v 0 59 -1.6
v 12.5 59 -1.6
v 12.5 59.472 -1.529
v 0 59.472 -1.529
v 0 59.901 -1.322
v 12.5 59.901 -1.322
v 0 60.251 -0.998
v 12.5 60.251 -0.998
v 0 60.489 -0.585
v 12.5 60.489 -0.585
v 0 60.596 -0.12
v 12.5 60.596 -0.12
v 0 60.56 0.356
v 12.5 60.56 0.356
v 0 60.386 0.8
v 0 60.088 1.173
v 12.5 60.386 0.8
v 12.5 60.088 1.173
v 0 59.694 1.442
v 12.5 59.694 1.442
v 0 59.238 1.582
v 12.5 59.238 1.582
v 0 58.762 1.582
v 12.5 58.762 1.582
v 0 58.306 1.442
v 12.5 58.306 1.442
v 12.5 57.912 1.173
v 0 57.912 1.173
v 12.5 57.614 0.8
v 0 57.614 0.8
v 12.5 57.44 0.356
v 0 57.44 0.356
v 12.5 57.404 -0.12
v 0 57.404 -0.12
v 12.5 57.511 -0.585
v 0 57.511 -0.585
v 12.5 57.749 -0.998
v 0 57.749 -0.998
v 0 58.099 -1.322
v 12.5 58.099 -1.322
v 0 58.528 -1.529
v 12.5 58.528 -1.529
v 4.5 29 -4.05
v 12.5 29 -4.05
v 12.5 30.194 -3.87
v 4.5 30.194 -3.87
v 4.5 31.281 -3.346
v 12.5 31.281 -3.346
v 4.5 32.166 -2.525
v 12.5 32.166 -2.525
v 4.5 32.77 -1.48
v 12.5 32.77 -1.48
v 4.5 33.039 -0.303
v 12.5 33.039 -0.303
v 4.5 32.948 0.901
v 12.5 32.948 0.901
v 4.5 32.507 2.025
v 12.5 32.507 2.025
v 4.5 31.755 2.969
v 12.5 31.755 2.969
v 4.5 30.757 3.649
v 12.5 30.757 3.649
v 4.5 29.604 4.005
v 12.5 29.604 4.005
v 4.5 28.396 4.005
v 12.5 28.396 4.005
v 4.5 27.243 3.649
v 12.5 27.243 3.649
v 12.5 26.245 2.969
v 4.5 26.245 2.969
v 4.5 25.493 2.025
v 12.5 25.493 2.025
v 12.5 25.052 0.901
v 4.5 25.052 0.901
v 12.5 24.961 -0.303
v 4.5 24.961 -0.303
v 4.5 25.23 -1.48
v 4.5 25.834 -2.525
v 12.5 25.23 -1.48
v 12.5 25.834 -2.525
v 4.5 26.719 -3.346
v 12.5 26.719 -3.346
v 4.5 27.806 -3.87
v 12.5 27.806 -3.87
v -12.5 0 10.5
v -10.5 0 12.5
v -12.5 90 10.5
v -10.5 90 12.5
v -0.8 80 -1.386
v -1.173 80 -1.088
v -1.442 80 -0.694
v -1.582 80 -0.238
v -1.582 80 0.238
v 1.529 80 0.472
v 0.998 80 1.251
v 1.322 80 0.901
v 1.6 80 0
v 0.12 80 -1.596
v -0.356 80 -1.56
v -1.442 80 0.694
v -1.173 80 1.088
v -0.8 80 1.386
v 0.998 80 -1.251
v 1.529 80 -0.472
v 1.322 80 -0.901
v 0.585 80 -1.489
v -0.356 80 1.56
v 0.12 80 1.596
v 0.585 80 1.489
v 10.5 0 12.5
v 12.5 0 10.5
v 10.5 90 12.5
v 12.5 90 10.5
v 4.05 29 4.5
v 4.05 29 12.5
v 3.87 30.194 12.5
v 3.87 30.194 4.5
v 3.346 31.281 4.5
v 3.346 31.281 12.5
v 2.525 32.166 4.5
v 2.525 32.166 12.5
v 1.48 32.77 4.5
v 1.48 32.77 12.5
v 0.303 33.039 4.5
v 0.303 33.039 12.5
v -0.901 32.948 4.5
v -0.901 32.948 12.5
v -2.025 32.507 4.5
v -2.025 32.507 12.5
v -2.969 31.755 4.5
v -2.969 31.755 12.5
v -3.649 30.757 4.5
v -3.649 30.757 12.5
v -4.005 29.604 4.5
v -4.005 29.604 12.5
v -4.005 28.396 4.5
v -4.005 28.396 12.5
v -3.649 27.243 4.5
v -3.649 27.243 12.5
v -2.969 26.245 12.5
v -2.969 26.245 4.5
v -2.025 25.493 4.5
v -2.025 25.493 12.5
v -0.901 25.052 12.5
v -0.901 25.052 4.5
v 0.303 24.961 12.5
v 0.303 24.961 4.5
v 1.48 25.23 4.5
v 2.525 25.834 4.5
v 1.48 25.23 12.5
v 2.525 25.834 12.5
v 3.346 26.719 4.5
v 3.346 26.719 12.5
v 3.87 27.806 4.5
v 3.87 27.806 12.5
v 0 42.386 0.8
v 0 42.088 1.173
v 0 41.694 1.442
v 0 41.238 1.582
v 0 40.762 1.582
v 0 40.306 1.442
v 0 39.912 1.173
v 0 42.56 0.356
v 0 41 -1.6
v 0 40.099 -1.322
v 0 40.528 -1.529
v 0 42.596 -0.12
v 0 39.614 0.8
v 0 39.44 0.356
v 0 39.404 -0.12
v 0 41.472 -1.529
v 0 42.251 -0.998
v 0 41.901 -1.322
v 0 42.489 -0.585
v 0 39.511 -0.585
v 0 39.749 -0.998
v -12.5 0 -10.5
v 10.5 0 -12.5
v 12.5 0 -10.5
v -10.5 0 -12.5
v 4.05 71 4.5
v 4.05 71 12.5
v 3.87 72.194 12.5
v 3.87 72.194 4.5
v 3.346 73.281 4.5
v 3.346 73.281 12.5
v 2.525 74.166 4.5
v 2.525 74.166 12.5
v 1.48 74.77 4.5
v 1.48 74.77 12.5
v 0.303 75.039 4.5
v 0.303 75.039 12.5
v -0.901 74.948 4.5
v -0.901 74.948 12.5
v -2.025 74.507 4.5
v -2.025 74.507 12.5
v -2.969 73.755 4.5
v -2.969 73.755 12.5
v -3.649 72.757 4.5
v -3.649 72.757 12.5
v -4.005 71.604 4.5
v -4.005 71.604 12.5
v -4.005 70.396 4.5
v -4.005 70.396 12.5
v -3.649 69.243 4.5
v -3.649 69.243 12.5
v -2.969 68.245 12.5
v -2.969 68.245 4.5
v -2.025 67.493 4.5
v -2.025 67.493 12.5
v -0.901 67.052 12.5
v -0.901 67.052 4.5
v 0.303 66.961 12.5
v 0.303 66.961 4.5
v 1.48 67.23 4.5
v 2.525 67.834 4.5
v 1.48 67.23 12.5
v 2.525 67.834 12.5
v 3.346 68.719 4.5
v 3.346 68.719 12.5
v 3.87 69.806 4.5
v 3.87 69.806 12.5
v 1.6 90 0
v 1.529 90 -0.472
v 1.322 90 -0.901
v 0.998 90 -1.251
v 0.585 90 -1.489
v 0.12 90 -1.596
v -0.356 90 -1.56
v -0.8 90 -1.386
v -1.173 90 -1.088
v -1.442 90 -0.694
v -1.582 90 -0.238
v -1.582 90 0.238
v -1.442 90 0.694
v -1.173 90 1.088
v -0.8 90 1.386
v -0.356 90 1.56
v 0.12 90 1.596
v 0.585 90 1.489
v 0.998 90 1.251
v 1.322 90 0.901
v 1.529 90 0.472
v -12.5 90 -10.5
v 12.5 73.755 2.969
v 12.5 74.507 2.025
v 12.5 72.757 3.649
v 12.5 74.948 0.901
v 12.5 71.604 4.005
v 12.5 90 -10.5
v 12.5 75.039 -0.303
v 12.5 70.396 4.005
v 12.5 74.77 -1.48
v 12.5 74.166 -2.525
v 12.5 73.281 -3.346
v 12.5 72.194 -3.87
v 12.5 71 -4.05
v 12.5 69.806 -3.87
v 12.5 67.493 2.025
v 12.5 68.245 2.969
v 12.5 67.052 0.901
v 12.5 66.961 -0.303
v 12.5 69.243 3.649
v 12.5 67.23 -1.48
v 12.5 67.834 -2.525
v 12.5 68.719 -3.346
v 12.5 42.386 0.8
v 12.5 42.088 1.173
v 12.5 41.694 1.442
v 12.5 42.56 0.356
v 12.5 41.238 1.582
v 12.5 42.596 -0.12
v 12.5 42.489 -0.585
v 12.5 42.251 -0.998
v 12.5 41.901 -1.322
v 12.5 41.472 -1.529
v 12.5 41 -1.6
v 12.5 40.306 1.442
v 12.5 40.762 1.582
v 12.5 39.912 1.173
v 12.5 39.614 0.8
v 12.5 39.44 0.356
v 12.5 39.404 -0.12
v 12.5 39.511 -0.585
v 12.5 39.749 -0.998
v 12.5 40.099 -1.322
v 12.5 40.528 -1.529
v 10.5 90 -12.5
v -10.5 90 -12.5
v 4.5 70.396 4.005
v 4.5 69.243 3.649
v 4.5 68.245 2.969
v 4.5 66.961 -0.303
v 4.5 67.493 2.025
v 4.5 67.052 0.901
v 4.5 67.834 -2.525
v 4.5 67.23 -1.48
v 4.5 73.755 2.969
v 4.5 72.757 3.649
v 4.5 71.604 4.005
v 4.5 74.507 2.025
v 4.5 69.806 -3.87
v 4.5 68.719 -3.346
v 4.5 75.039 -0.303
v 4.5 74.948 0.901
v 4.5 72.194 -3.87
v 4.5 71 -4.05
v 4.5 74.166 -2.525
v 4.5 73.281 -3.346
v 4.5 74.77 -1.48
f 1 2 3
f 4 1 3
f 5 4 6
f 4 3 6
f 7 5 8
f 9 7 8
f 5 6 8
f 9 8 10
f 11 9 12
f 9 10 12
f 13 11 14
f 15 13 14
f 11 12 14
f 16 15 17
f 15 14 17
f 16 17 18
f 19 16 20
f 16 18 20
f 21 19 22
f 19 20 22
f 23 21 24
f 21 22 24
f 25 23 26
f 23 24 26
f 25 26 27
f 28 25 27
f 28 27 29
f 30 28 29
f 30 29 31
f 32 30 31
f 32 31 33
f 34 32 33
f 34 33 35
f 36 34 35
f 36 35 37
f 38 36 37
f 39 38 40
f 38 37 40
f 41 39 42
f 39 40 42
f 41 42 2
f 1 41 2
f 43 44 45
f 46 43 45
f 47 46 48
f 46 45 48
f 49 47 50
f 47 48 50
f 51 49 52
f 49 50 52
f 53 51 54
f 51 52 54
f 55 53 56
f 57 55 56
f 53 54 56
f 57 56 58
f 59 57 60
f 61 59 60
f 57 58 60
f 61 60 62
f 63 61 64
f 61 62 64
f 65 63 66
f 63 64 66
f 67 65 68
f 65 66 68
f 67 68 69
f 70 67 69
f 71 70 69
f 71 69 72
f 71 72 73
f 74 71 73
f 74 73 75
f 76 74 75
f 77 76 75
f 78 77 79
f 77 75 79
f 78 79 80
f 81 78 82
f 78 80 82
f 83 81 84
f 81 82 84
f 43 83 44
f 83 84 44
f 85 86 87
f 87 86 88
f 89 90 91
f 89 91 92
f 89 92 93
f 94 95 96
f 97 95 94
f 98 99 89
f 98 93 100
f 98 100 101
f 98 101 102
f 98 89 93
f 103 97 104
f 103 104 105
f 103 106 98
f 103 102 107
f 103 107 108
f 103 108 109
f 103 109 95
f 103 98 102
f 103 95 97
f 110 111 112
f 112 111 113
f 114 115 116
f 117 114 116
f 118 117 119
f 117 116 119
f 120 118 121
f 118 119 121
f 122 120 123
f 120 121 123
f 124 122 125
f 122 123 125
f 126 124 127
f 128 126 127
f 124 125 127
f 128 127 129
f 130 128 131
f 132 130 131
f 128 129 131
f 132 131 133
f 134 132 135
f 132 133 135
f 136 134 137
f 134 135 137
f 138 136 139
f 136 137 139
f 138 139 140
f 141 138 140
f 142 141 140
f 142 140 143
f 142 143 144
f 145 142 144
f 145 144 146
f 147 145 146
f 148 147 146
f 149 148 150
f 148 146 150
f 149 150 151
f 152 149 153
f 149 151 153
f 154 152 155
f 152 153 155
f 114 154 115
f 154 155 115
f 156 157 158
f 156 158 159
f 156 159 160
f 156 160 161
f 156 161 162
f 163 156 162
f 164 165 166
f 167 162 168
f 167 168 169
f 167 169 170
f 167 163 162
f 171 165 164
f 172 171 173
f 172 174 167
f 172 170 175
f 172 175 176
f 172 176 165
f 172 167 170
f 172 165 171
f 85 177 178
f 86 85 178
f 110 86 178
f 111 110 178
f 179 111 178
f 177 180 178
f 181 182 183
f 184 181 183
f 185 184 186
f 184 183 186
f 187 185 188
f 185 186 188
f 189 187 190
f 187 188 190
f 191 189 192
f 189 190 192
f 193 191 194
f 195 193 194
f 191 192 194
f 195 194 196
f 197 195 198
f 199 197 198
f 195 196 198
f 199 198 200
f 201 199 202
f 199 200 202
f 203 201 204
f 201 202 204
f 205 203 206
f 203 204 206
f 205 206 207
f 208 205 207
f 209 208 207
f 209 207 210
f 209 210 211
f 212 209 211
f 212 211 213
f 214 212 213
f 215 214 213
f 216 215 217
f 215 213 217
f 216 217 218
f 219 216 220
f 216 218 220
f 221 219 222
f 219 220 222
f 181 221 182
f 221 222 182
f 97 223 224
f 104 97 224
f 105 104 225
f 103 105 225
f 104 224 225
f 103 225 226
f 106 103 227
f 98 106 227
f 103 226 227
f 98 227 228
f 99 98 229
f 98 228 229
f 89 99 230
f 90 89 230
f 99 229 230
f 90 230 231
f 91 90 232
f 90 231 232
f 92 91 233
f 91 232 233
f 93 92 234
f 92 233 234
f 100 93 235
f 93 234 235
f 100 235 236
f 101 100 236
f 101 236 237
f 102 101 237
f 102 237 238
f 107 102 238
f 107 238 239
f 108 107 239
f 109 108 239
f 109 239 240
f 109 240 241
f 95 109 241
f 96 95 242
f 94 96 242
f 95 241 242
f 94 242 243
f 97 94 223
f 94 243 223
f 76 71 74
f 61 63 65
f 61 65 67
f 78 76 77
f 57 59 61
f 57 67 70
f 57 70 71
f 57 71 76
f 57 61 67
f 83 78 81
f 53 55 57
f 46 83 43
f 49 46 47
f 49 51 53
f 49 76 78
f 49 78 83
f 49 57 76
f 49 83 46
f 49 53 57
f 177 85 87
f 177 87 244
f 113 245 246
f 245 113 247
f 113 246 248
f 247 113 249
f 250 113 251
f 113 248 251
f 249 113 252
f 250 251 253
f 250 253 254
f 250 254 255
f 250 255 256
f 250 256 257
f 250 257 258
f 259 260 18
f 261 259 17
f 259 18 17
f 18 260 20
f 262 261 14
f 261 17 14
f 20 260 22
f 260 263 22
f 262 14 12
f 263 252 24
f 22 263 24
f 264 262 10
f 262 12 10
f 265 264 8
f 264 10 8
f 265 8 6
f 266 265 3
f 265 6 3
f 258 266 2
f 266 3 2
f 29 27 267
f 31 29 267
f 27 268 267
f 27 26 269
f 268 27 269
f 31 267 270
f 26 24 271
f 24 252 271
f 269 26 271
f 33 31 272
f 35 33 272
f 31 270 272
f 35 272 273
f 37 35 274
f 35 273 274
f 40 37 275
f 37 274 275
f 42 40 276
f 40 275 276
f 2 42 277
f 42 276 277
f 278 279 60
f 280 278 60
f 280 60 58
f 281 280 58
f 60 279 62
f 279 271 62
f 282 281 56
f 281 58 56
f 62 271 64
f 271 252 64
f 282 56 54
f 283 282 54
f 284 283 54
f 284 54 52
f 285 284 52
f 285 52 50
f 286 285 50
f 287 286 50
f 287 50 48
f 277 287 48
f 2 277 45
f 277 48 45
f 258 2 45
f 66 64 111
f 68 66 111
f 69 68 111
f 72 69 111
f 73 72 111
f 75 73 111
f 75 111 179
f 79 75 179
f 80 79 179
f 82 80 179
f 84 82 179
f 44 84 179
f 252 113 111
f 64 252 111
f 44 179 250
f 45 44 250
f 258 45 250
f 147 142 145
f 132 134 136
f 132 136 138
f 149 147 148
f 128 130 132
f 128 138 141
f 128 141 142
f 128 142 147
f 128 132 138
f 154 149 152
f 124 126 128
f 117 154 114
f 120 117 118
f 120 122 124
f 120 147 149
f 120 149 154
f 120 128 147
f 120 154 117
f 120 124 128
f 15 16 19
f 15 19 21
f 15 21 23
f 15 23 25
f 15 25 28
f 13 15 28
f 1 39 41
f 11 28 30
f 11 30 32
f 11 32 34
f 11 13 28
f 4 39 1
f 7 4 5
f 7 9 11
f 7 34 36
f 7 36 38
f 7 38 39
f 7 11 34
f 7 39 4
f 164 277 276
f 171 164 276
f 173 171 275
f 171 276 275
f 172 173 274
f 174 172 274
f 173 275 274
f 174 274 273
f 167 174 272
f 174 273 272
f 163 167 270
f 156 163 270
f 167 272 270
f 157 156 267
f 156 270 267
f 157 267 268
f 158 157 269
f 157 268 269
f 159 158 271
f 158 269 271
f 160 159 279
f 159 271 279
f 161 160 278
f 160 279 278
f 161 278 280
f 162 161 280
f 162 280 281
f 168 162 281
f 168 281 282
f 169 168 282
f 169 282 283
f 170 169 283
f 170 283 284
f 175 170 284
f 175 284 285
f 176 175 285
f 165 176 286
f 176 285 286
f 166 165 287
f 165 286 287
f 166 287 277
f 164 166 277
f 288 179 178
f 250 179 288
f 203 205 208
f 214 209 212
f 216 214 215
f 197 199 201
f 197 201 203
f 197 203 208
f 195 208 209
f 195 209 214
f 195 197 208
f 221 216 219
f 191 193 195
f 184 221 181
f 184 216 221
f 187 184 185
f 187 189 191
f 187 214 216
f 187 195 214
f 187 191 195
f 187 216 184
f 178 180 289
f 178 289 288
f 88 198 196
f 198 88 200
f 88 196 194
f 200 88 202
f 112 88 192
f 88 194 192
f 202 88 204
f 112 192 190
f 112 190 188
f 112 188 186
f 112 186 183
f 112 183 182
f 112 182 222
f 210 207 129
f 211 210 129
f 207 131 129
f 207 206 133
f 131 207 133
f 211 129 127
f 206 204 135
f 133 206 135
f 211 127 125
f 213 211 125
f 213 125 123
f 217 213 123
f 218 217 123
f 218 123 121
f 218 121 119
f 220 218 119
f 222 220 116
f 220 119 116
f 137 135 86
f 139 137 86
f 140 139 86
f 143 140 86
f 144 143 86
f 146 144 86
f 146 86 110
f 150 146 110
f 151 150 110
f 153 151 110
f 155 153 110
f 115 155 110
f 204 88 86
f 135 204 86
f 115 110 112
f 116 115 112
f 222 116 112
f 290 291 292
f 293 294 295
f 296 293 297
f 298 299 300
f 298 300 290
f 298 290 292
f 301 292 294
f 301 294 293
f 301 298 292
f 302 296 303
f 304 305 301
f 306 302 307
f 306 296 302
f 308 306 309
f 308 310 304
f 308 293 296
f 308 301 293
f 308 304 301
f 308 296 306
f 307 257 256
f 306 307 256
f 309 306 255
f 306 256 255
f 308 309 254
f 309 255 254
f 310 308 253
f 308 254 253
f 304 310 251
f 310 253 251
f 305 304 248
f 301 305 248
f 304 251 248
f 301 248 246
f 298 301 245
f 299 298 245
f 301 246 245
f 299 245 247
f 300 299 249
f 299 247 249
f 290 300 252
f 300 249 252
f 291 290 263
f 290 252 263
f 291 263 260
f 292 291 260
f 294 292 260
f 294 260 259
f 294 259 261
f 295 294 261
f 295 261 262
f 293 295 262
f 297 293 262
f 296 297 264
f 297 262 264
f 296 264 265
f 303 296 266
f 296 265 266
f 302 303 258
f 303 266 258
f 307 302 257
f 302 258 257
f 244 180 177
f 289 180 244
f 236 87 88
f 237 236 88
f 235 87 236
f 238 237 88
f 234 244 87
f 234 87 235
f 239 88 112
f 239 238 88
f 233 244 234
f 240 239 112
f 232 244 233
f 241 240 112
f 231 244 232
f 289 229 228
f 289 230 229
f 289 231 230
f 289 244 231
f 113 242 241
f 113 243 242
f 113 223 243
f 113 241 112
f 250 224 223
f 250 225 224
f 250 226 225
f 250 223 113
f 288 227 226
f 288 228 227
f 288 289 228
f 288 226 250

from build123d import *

# Parameters (mm, degrees)
SKETCH1_W           = 25
SKETCH1_H           = 25
BOSS_EXTRUDE1_DEPTH = 90
SKETCH2_R           = 4.05
CUT_EXTRUDE1_DEPTH  = 8
SKETCH3_R           = 4.05
CUT_EXTRUDE7_DEPTH  = 8
CHAMFER1_SIZE       = 2
SKETCH5_R           = 1.6
CUT_EXTRUDE8_DEPTH  = 12.5
SKETCH7_R           = 1.6
CUT_EXTRUDE9_DEPTH  = 10


with BuildPart() as part:
    # Sketch1 → Boss-Extrude1 (new body)
    with BuildSketch(Plane(origin=(0, 0, 0), x_dir=(1, 0, 0), z_dir=(0, 1, 0))):
        Rectangle(SKETCH1_W, SKETCH1_H)
    extrude(amount=BOSS_EXTRUDE1_DEPTH)

    # Sketch2 → Cut-Extrude1 (cut)
    with BuildSketch(Plane(origin=(12.5, 0, 0), x_dir=(0, 0, -1), z_dir=(1, 0, 0))):
        with Locations((0, 71)):
            Circle(SKETCH2_R)
        with Locations((0, 29)):
            Circle(SKETCH2_R)
    extrude(amount=-CUT_EXTRUDE1_DEPTH, mode=Mode.SUBTRACT)

    # Sketch3 → Cut-Extrude7 (cut)
    with BuildSketch(Plane.XY.offset(12.5)):
        with Locations((0, 29)):
            Circle(SKETCH3_R)
        with Locations((0, 71)):
            Circle(SKETCH3_R)
    extrude(amount=-CUT_EXTRUDE7_DEPTH, mode=Mode.SUBTRACT)

    # Chamfer1
    chamfer1_edges = [part.edges().sort_by_distance(p)[0] for p in [
        (12.5, 45, 12.5),
        (-12.5, 45, 12.5),
        (-12.5, 45, -12.5),
        (12.5, 45, -12.5),
    ]]
    chamfer(chamfer1_edges, length=CHAMFER1_SIZE)

    # Sketch5 → Cut-Extrude8 (cut)
    with BuildSketch(Plane(origin=(12.5, 0, 0), x_dir=(0, 0, -1), z_dir=(1, 0, 0))):
        with Locations((0, 59)):
            Circle(SKETCH5_R)
        with Locations((0, 41)):
            Circle(SKETCH5_R)
    extrude(amount=-CUT_EXTRUDE8_DEPTH, mode=Mode.SUBTRACT)

    # Sketch7 → Cut-Extrude9 (cut)
    with BuildSketch(Plane(origin=(0, 90, 0), x_dir=(1, 0, 0), z_dir=(0, 1, 0))):
        Circle(SKETCH7_R)
    extrude(amount=-CUT_EXTRUDE9_DEPTH, mode=Mode.SUBTRACT)


solid = part.part
